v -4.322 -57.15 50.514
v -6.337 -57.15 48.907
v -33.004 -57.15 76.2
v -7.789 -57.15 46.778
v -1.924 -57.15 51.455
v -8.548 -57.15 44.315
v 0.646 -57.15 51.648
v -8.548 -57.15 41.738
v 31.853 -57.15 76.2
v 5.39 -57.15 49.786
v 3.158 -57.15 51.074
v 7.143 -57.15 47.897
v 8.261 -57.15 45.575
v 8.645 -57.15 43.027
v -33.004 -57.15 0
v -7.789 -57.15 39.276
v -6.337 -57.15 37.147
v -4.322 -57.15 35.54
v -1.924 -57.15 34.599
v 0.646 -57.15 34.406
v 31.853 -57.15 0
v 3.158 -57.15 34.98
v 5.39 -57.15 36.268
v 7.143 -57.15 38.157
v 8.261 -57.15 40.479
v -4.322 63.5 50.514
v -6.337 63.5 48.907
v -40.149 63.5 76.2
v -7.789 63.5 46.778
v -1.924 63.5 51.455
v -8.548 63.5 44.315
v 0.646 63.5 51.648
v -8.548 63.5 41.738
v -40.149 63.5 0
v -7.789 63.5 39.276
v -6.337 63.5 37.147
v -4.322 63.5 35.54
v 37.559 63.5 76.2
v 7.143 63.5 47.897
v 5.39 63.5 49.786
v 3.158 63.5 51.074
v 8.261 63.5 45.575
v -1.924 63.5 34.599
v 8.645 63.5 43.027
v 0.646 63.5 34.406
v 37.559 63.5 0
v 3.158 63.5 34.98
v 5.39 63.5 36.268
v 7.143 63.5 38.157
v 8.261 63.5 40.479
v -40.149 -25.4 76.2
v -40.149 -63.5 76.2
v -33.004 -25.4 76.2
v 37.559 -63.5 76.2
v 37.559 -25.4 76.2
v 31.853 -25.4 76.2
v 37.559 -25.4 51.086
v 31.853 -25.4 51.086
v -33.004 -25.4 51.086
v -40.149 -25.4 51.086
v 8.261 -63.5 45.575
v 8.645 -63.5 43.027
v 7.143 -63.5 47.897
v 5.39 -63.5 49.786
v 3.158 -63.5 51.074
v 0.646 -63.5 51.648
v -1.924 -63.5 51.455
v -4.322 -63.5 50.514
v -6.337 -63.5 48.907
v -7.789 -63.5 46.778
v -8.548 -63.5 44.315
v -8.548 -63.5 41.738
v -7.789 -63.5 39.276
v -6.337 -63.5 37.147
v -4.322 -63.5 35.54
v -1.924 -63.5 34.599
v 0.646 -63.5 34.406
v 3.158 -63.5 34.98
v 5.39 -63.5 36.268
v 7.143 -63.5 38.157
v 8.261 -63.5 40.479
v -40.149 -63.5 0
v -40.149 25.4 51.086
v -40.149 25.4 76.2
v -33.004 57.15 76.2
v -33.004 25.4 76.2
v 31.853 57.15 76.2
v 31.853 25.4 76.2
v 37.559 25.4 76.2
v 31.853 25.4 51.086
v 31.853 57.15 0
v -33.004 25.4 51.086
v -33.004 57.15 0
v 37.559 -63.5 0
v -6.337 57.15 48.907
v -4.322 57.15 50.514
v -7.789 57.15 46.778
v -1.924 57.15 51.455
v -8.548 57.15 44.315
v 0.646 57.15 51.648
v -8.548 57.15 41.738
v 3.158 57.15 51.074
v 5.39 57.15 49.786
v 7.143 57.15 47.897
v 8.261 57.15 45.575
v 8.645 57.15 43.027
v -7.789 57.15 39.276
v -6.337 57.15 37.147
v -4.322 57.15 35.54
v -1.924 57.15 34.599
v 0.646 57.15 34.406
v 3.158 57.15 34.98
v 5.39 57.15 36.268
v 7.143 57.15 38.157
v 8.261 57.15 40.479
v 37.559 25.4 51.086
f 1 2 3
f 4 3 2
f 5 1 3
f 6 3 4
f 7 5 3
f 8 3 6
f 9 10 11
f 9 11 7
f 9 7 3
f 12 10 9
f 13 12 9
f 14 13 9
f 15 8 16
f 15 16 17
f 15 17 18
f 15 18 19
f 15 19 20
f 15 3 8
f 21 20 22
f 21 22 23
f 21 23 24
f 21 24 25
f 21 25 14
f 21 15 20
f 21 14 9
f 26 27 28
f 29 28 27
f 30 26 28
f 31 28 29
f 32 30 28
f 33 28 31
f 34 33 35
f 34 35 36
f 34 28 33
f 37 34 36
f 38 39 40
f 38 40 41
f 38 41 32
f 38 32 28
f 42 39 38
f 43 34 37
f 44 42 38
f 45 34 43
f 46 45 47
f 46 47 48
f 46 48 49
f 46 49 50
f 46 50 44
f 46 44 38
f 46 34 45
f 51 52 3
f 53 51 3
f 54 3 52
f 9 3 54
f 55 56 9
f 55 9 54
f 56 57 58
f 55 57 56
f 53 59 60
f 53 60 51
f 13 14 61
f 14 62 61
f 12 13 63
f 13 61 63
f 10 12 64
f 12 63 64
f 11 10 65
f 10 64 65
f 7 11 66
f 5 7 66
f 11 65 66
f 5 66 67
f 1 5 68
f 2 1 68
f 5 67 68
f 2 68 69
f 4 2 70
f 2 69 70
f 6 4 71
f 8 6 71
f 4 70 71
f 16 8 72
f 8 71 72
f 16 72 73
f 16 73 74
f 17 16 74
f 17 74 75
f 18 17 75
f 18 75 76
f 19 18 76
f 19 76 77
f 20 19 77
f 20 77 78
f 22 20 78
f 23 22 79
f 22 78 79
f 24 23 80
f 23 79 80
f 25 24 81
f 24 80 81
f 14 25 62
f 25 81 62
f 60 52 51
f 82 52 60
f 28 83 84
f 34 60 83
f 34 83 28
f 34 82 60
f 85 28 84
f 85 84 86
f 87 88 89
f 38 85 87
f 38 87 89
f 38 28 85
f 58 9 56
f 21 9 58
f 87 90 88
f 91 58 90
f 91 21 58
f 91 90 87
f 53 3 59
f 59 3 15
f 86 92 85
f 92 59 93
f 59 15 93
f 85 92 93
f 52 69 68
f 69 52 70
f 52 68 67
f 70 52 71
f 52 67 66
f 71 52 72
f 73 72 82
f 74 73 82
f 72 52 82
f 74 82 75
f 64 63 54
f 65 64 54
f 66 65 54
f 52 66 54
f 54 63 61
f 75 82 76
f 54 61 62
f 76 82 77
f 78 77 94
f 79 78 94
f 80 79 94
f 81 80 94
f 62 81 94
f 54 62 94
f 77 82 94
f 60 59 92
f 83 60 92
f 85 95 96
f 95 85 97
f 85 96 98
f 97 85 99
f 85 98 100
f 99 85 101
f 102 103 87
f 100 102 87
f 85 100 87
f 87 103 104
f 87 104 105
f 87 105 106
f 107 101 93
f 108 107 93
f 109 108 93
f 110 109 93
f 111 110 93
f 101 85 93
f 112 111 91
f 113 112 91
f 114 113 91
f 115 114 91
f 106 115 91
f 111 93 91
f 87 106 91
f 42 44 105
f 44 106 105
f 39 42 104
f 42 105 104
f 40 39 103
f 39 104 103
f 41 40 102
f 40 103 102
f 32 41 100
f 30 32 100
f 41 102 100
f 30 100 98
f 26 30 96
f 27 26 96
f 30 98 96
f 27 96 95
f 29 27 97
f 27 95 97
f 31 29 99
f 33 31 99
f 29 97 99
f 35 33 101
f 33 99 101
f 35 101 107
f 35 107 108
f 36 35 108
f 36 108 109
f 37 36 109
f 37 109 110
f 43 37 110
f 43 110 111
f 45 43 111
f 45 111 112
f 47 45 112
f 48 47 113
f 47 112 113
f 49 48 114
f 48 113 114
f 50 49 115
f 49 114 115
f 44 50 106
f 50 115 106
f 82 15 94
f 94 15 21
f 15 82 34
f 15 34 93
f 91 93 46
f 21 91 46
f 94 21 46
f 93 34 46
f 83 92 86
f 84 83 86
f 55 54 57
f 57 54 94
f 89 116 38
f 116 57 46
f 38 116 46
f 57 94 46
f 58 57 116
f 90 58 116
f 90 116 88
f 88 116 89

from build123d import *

# Parameters (mm, degrees)
F0_W     = 77.707555145
F0_H     = 127
F1_DEPTH = 76.2
F2_W     = 64.8572534889
F2_H     = 114.3
F3_DEPTH = 123.444
F4_R     = 8.6449584046
F5_DEPTH = 116.078
F6_W     = 50.8
F6_H     = 25.32691136
F7_DEPTH = 58.674


with BuildPart() as f1:
    # F0 (on Top) → F1 (new body)
    with BuildSketch(Plane.XY):
        with Locations((-1.2951251119, 0)):
            Rectangle(F0_W, F0_H)
    extrude(amount=F1_DEPTH)

    # F2 (on Top) → F3 (cut)
    with BuildSketch(Plane.XY):
        with Locations((-0.5756113678, 0)):
            Rectangle(F2_W, F2_H)
    extrude(amount=F3_DEPTH, mode=Mode.SUBTRACT)

    # F4 (on Front) → F5 (cut, symmetric)
    with BuildSketch(Plane.XZ):
        with Locations((0, 43.0269613862)):
            Circle(F4_R)
    extrude(amount=F5_DEPTH, both=True, mode=Mode.SUBTRACT)

    # F6 (on Right) → F7 (cut, symmetric)
    with BuildSketch(Plane.YZ):
        with Locations((0, 63.7489762157)):
            Rectangle(F6_W, F6_H)
    extrude(amount=F7_DEPTH, both=True, mode=Mode.SUBTRACT)


solid = f1.part
